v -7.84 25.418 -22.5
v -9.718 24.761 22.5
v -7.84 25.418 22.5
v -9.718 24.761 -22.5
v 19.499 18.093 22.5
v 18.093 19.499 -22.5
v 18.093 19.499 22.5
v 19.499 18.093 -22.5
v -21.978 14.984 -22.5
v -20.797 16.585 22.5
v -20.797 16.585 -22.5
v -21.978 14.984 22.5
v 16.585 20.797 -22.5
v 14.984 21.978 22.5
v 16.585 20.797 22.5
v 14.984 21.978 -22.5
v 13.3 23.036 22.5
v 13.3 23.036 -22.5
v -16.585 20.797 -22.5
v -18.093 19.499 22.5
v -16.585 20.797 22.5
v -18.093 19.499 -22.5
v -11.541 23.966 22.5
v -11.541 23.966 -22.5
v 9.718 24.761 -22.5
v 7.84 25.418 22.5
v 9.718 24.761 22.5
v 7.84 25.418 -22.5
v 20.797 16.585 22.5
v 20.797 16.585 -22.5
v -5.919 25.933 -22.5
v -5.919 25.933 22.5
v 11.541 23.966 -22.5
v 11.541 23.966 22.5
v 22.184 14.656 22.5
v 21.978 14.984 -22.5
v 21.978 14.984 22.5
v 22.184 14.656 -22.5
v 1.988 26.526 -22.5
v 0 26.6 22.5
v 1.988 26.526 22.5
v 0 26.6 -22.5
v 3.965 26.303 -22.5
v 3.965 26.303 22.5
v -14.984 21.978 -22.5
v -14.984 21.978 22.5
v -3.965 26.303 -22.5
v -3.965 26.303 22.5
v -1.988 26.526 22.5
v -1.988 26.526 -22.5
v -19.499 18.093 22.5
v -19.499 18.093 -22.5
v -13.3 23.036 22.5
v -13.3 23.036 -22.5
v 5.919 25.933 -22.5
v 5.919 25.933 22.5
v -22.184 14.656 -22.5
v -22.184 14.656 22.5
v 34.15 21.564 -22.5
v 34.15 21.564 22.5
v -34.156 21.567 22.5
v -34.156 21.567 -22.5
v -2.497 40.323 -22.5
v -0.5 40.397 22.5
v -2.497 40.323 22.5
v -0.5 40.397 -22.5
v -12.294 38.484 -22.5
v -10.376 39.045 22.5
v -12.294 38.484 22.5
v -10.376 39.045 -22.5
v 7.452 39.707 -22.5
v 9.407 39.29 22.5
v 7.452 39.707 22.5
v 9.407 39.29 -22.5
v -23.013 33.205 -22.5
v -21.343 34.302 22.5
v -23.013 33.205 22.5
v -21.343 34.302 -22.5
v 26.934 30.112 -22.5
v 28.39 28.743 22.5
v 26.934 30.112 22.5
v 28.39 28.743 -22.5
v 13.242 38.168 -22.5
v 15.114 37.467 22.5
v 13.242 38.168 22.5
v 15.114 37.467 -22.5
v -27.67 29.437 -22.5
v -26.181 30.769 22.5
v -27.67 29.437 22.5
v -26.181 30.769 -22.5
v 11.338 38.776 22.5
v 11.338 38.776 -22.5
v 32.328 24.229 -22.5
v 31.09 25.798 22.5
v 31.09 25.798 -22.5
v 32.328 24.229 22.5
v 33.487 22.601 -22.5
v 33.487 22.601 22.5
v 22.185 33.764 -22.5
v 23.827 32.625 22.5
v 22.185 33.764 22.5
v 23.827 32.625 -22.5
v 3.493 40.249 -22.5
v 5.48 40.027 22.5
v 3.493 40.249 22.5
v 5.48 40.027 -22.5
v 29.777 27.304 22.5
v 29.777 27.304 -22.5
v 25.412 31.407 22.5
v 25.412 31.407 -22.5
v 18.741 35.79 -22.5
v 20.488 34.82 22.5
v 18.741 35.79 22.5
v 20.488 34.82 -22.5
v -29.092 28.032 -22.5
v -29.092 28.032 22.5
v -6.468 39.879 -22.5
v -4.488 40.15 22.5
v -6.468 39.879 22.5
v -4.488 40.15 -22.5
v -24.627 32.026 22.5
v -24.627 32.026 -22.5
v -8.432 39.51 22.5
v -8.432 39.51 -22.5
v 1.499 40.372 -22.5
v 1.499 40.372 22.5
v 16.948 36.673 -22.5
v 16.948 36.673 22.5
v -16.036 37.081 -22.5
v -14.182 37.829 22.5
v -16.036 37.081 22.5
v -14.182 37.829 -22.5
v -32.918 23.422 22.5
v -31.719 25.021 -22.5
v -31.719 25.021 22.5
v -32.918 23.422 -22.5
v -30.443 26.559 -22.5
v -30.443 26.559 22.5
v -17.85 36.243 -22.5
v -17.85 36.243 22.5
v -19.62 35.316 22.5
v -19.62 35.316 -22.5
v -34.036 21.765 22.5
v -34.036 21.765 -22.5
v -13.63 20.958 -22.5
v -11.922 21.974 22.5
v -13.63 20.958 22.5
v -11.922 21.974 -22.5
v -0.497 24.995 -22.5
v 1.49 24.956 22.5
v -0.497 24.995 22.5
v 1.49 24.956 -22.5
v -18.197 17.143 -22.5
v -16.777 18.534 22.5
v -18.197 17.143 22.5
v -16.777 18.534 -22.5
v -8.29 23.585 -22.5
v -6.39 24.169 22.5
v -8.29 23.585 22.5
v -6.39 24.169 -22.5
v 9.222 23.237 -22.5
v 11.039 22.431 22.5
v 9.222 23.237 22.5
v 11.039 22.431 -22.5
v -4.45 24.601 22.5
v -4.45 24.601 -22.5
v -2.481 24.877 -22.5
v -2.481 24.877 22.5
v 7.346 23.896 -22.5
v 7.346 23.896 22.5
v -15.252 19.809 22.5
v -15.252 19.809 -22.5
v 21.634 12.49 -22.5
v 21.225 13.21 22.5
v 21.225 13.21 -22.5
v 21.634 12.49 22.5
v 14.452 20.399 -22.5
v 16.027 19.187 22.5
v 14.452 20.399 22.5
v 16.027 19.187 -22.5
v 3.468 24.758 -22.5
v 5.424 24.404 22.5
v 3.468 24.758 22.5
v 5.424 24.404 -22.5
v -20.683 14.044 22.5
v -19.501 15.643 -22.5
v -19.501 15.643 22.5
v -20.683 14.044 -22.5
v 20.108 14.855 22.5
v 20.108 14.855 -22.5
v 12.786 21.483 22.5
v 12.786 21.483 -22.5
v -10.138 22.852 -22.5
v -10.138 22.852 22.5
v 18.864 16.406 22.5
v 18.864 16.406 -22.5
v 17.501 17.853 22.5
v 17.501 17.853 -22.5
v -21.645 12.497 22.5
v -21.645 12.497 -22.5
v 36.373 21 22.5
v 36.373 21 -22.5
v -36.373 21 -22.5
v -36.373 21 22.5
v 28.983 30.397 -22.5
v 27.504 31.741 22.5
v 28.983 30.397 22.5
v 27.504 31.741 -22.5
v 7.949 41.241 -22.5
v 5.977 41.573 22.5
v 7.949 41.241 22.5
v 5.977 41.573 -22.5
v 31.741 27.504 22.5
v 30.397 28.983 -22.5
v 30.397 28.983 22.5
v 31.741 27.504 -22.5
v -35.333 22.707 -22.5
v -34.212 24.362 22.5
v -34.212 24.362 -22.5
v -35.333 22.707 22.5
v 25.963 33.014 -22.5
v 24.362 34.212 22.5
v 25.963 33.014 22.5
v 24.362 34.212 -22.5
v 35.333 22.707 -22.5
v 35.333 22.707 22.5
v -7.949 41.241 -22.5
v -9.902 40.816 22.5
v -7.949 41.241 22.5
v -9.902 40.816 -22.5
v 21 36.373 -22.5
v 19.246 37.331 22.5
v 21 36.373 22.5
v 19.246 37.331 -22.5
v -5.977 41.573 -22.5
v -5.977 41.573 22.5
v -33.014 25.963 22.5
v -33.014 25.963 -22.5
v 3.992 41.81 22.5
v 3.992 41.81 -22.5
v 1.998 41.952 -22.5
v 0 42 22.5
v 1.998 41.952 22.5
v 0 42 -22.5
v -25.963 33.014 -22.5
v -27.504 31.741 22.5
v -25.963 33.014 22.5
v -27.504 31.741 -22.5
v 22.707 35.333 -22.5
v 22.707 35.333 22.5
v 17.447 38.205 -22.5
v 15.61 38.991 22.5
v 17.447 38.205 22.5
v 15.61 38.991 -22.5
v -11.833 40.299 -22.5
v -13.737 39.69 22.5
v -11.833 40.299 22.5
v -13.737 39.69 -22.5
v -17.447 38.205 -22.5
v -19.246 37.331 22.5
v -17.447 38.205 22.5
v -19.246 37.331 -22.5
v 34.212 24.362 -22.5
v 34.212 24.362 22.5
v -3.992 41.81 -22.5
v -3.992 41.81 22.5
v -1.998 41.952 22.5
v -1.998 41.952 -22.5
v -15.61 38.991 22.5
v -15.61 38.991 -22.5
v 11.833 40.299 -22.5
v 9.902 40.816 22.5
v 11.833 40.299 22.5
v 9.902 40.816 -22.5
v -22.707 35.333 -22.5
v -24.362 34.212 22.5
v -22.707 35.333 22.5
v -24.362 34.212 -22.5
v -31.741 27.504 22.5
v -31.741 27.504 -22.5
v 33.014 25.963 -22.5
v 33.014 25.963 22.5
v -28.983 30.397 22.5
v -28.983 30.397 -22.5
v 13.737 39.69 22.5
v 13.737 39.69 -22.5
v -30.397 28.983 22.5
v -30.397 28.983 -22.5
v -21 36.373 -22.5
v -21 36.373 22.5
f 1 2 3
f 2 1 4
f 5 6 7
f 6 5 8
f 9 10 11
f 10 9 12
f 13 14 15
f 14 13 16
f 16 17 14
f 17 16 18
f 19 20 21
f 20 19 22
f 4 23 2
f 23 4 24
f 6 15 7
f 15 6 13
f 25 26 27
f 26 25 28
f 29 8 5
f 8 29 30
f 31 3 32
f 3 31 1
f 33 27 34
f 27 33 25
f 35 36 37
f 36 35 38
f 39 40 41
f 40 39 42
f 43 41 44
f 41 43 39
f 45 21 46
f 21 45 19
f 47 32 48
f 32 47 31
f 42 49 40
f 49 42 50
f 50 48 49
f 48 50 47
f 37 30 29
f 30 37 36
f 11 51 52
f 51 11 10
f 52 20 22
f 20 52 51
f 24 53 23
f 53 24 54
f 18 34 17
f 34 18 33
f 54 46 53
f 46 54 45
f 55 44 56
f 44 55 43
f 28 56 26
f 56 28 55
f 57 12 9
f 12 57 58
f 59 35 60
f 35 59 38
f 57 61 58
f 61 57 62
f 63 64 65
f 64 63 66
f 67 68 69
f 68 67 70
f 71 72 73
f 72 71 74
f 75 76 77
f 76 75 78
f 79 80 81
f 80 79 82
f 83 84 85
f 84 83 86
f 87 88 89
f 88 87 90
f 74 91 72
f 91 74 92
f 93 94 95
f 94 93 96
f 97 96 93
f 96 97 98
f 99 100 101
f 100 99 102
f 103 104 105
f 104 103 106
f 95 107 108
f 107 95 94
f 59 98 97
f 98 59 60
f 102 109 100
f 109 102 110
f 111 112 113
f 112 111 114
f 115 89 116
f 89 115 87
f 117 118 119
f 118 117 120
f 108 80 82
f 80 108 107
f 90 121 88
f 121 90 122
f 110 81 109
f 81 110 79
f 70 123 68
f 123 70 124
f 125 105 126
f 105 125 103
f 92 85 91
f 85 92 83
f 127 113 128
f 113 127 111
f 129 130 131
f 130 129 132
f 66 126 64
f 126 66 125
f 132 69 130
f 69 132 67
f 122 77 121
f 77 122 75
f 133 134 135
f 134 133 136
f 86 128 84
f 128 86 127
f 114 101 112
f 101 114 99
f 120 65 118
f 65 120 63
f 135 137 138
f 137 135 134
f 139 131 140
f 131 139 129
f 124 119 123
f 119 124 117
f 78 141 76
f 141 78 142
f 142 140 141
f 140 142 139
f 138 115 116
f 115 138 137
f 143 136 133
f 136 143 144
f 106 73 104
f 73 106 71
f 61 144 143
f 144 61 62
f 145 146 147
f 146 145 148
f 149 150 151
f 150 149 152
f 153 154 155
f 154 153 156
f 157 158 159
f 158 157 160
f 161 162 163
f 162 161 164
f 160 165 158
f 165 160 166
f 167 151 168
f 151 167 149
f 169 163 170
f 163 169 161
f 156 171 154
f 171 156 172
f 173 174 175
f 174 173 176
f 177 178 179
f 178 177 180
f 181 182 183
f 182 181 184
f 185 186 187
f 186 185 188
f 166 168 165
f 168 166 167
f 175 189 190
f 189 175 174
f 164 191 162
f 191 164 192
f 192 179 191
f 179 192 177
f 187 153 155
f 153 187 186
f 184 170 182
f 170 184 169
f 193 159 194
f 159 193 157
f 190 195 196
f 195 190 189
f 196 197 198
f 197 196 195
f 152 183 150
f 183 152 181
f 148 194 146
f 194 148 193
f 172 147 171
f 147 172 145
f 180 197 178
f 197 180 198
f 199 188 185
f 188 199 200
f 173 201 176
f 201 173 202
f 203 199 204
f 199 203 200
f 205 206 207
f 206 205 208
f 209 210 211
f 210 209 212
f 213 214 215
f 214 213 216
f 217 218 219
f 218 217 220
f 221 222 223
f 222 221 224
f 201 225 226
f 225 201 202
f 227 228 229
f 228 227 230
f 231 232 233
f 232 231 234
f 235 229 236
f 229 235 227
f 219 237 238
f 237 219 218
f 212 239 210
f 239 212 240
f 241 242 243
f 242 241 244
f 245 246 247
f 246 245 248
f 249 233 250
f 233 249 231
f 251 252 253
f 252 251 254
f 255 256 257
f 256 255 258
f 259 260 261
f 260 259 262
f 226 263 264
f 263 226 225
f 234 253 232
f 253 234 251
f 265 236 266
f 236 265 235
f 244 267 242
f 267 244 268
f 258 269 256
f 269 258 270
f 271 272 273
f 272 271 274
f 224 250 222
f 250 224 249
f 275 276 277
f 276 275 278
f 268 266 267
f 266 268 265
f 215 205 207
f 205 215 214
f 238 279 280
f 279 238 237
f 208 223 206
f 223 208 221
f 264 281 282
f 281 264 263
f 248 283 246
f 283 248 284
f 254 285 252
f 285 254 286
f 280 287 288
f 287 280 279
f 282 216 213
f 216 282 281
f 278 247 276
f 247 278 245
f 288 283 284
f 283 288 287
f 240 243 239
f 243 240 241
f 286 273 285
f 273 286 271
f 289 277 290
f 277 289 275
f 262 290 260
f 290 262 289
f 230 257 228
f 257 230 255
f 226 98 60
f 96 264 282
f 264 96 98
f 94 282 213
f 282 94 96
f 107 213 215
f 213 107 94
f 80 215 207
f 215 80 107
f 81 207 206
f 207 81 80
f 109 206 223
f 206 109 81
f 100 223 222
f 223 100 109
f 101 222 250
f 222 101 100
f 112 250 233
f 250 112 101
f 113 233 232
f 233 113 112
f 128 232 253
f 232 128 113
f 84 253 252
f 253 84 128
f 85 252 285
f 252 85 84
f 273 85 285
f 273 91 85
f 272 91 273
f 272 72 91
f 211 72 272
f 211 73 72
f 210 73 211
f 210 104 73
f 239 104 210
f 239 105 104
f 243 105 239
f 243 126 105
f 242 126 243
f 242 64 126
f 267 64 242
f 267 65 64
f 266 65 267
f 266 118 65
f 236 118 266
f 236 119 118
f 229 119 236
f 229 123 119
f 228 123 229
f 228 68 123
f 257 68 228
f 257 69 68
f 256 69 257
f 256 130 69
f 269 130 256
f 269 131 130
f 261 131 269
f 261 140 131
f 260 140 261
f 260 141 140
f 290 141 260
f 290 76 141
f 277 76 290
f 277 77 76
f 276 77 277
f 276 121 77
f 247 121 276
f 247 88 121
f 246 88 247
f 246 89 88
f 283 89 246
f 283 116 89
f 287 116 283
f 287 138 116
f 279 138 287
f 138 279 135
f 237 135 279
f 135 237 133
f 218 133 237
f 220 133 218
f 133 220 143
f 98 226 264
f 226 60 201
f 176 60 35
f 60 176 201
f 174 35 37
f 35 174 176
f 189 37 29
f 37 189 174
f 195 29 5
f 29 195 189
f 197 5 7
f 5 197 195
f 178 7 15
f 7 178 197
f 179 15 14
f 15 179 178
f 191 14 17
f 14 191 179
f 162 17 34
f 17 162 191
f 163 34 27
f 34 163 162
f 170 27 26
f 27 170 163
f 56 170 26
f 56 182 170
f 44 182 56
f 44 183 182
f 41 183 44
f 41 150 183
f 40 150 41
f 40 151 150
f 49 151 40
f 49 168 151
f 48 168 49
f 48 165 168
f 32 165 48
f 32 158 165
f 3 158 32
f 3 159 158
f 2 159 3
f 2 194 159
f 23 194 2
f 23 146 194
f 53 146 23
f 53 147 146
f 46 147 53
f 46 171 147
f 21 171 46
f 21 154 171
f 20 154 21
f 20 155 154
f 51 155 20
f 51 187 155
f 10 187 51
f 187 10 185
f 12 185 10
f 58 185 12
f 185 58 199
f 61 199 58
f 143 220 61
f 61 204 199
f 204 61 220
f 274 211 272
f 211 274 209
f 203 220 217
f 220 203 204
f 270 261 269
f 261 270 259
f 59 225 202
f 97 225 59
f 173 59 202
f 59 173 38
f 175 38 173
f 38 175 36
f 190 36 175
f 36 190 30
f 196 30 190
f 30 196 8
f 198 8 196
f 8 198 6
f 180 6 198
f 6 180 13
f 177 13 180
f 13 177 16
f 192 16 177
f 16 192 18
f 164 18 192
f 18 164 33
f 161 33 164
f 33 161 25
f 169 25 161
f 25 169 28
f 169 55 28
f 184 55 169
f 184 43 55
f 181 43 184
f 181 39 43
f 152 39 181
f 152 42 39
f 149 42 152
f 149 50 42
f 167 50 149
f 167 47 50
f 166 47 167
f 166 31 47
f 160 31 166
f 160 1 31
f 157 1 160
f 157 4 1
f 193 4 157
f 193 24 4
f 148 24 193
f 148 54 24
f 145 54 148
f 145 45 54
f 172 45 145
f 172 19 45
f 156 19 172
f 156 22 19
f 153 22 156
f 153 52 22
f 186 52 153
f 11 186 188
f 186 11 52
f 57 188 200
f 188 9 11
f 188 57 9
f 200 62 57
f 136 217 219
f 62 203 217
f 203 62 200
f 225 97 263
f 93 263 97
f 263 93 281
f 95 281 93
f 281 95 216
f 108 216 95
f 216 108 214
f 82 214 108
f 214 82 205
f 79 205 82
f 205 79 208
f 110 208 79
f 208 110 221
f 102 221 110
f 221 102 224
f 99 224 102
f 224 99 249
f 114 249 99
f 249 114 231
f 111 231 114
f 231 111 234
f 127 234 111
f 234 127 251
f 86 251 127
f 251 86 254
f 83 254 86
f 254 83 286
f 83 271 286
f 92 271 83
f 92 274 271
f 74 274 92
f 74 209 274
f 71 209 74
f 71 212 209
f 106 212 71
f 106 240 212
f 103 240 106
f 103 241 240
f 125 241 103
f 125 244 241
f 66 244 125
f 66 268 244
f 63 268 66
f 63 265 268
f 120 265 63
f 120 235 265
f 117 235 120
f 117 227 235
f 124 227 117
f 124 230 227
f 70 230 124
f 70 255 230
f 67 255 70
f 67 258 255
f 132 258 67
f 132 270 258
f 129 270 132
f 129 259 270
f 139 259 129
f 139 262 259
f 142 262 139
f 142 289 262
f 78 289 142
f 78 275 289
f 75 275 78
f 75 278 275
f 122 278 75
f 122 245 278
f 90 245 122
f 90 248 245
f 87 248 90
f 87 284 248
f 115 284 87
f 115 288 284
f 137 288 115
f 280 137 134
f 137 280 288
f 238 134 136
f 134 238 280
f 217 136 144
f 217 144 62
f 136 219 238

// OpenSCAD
// Input variables
seg_thk=45;     // Width of spool between flanges
inner_rad=25;   // Radius of spool hub
width=17;       // Required width of segment
arc=120;        // segment length in degrees

// Calculated variables
outer_rad=inner_rad+width;  // New spool hub radius
wall=1.6;
clear_thk=seg_thk+2;
ang=(180-arc)/2;

// Overall definition
$fa=1;

// Cut away half of a cylinder
module CutHalf(y_off,extra_thk)
{
translate([0,-1*y_off,0])
    cube([outer_rad*2,inner_rad*2,seg_thk+extra_thk],true);
}

{
difference()
    {
    cylinder(seg_thk,r=outer_rad,center=true);   // New hub 

    union()
        {
        cylinder(seg_thk+2,r=inner_rad,center=true);    // Loose existing hub
        rotate([0,0,ang]) CutHalf(inner_rad,2);     // Loose one side
        rotate([0,0,-ang]) CutHalf(inner_rad,2);    // And the other
        difference()    // Now hollow out the segment
            {
            cylinder(seg_thk+2,r=outer_rad-wall,center=true);
                
            union()
                {
                cylinder(seg_thk+4,r=inner_rad+wall,center=true);
                rotate([0,0,ang]) CutHalf(inner_rad-wall,4);
                rotate([0,0,-1*ang]) CutHalf(inner_rad-wall,4);
                }
            }
        }
    }

}

